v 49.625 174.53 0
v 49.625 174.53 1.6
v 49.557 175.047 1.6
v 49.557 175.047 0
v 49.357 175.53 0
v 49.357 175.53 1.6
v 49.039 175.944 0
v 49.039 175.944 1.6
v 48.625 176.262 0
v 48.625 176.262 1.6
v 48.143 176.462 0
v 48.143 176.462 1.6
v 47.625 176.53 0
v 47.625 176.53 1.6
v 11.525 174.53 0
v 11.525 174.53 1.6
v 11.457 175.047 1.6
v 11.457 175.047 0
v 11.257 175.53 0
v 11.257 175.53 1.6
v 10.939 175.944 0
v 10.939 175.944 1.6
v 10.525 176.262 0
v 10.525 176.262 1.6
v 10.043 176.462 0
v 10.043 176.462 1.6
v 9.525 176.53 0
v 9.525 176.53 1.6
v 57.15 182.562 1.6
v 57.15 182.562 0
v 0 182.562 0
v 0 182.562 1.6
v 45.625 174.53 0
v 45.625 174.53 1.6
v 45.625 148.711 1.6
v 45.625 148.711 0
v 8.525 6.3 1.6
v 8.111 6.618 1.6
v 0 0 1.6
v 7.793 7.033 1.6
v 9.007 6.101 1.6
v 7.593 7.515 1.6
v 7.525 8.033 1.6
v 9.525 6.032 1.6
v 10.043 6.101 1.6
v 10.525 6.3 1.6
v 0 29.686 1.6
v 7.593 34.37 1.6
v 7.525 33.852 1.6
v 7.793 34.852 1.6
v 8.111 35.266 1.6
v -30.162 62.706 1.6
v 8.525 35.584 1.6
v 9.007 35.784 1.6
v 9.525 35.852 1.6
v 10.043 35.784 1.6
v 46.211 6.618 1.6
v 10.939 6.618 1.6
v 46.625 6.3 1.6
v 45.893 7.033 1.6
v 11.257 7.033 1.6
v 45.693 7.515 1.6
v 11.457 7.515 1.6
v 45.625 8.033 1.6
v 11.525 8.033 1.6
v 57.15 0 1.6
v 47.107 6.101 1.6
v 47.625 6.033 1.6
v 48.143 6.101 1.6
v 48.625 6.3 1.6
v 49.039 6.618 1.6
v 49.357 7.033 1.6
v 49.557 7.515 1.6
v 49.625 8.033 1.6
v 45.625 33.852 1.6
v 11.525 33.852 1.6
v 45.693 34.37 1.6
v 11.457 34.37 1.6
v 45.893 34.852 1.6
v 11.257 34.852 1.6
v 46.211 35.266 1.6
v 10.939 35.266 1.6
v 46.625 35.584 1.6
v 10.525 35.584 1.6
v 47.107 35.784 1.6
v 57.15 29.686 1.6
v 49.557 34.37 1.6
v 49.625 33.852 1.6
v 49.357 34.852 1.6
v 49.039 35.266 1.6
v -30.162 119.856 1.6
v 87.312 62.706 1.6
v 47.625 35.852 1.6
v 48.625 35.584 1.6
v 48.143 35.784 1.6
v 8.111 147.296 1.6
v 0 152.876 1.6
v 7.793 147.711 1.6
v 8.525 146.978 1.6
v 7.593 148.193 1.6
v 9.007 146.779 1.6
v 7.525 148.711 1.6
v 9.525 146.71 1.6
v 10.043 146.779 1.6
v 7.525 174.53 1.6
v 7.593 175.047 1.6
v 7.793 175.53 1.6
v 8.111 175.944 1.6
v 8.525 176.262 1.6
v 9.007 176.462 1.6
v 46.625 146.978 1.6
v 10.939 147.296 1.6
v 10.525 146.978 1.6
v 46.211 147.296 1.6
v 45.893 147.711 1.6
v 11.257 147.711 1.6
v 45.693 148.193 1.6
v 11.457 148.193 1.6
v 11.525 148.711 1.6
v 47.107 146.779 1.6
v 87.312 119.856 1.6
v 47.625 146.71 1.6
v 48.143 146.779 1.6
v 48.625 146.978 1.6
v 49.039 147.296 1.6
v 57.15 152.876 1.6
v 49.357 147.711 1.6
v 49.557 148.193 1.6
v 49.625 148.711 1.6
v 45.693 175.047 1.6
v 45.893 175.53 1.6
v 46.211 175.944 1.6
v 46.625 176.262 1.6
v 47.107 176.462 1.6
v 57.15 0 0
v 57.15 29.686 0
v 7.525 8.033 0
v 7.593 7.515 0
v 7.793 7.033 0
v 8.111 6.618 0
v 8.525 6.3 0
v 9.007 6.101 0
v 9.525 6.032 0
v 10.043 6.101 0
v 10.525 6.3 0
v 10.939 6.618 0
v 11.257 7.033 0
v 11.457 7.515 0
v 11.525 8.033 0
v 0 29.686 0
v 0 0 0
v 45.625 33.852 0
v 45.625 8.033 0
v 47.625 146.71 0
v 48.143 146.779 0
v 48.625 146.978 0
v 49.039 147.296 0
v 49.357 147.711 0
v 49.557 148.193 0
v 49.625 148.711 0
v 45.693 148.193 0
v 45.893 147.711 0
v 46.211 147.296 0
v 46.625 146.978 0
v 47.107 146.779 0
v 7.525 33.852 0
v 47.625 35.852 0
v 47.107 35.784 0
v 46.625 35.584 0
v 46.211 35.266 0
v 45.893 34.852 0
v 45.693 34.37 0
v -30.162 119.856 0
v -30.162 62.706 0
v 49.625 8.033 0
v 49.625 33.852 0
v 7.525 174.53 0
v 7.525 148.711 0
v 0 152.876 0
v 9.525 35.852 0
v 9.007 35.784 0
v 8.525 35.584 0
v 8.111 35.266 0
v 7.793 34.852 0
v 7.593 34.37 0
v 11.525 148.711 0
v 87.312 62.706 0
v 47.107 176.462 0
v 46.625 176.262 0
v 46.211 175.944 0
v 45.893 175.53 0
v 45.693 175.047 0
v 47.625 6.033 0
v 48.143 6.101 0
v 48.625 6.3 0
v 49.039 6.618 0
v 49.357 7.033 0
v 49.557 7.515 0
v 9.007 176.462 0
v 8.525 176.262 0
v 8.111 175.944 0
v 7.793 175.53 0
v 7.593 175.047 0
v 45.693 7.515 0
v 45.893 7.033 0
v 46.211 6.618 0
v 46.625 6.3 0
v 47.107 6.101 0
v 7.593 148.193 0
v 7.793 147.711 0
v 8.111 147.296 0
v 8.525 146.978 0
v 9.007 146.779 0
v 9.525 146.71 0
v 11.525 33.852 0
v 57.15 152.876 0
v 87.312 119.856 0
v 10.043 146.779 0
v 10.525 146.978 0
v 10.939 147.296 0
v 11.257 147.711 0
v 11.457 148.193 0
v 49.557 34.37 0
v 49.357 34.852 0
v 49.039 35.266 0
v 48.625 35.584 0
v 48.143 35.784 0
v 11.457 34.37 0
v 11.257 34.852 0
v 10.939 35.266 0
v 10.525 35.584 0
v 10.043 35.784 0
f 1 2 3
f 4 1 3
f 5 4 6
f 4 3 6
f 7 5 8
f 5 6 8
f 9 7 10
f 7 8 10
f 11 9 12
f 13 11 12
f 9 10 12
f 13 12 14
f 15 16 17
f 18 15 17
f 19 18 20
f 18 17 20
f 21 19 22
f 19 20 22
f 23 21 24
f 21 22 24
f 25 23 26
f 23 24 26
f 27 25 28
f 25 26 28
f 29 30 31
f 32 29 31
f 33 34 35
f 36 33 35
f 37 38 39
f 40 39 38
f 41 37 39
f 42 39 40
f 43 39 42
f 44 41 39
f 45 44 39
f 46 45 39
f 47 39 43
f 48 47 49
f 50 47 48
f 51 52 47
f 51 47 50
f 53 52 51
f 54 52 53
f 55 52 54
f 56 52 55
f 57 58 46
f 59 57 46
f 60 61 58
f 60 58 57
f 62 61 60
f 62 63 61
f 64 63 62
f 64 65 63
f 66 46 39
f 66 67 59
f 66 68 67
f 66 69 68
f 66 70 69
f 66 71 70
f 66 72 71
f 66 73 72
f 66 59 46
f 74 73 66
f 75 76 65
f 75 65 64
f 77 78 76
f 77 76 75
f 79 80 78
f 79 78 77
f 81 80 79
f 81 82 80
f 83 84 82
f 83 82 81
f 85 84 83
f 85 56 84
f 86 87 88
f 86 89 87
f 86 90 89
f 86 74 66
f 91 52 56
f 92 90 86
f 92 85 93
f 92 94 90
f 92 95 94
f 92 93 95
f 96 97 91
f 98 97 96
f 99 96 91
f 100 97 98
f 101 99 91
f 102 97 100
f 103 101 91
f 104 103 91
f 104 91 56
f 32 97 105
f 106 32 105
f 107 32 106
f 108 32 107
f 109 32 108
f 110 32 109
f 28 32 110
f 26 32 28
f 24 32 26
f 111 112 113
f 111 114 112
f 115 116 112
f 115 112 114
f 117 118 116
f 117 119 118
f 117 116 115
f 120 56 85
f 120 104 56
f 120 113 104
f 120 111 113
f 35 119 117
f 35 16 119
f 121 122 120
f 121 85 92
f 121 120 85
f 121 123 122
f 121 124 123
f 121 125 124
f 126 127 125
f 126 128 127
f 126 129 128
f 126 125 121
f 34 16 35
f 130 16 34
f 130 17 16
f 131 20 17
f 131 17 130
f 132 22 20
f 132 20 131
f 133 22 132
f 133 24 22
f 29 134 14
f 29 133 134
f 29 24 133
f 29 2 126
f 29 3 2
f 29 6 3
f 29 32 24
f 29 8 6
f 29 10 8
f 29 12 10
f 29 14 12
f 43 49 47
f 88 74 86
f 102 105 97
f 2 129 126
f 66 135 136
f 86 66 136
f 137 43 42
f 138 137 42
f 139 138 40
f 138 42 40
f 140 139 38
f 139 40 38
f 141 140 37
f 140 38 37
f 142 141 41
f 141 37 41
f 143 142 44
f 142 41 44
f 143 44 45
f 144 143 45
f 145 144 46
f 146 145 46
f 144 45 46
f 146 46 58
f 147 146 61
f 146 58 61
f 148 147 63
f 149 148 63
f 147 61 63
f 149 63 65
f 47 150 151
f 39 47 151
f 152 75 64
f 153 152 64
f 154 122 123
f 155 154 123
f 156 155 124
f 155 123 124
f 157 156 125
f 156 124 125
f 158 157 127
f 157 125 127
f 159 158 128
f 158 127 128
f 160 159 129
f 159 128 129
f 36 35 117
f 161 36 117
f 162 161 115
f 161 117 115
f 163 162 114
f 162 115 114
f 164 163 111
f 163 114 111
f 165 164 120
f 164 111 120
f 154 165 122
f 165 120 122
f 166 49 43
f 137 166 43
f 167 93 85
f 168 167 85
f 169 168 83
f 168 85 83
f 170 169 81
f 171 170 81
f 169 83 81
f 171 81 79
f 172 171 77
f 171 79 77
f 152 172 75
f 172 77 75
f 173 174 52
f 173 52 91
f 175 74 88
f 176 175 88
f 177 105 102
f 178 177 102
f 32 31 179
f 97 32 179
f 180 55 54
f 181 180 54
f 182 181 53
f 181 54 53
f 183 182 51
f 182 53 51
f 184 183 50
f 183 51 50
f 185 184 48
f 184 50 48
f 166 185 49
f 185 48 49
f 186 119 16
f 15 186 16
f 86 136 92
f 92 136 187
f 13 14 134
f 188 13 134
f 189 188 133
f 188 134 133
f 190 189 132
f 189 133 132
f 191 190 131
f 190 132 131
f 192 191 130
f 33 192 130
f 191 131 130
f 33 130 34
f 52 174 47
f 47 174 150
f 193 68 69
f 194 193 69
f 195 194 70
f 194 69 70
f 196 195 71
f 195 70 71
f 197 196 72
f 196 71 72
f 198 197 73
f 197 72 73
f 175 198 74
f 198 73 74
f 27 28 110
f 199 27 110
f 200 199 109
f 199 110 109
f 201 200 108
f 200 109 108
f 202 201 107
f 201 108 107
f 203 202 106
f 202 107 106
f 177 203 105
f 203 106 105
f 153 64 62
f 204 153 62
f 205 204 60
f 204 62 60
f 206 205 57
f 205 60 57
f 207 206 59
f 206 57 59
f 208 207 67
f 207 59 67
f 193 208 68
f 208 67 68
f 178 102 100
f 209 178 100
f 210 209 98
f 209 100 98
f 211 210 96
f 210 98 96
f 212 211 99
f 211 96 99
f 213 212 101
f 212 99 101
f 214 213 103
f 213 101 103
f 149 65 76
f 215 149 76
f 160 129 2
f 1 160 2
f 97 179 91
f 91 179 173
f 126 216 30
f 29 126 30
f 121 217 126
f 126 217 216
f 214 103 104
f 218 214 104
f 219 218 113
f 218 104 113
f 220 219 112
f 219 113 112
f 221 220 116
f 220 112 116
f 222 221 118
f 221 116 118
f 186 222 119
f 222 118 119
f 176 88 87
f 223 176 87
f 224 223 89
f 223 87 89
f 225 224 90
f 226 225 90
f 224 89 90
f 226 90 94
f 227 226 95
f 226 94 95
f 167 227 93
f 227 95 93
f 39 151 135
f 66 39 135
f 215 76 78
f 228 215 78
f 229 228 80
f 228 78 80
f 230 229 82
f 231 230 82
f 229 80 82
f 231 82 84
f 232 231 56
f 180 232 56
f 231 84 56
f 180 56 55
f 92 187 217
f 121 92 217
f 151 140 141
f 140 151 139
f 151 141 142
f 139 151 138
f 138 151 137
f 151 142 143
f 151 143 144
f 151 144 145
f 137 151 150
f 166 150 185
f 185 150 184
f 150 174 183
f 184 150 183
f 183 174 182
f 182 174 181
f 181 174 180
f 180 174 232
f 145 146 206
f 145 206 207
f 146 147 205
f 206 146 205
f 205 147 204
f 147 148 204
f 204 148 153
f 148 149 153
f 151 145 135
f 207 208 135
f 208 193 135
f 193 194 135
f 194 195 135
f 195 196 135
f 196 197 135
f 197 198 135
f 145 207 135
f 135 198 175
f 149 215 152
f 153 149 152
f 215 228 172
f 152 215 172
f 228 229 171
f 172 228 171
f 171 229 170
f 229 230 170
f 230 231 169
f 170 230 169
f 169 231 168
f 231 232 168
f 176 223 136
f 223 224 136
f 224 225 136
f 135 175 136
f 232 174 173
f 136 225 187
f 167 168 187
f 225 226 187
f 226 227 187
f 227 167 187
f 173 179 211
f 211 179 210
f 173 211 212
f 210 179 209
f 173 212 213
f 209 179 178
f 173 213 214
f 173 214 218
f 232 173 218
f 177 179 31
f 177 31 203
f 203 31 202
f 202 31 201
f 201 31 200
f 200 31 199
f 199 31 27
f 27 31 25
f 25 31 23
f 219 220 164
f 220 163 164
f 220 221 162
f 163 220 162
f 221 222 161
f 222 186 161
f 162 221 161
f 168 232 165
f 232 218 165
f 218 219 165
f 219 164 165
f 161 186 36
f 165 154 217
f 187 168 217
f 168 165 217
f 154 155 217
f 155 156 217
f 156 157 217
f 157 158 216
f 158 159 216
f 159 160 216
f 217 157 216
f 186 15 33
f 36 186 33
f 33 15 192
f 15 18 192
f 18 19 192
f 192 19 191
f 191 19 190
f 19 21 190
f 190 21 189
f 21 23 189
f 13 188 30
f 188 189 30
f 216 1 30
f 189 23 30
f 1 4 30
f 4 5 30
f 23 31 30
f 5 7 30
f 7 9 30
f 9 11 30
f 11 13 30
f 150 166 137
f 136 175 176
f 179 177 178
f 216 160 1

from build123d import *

# Parameters (mm, degrees)
F0_W     = 30.1625
F0_H     = 57.15
F0_W_2   = 57.15
F1_DEPTH = 1.6002
F3_DEPTH = 1.6012


with BuildPart() as f1:
    # F0 (on Top) → F1 (new body)
    with BuildSketch(Plane.XY):
        Polygon((57.15, 62.70625), (57.15, 29.68625), (87.3125, 62.70625), align=None)
        Polygon((-30.1625, 62.70625), (0, 29.68625), (0, 62.70625), align=None)
        Polygon((57.15, 152.87625), (57.15, 119.85625), (87.3125, 119.85625), align=None)
        Polygon((-30.1625, 119.85625), (0, 119.85625), (0, 152.87625), align=None)
        Polygon((0, 29.68625), (0, 0), (57.15, 0), (57.15, 29.68625), (57.15, 62.70625), (0, 62.70625), align=None)
        with Locations((-15.08125, 91.28125)):
            Rectangle(F0_W, F0_H)
        with Locations((72.23125, 91.28125)):
            Rectangle(F0_W, F0_H)
        with Locations((28.575, 91.28125)):
            Rectangle(F0_W_2, F0_H)
        Polygon((0, 152.87625), (0, 119.85625), (57.15, 119.85625), (57.15, 152.87625), (57.15, 182.5625), (0, 182.5625), align=None)
    extrude(amount=F1_DEPTH)

    # F2 (on face) → F3 (cut, through all)
    with BuildSketch(Plane.XY.offset(1.6002)):
        with BuildLine():
            ThreePointArc((11.52525, 174.52975), (10.9393903391, 175.9441403391), (9.525, 176.53))
            ThreePointArc((9.525, 176.53), (8.1106096609, 175.9441403391), (7.52475, 174.52975))
            Line((7.52475, 174.52975), (7.52475, 148.71065))
            ThreePointArc((7.52475, 148.71065), (8.1106096609, 147.2962596609), (9.525, 146.7104))
            ThreePointArc((9.525, 146.7104), (10.9393903391, 147.2962596609), (11.52525, 148.71065))
            Line((11.52525, 148.71065), (11.52525, 174.52975))
        make_face()
        with BuildLine():
            ThreePointArc((49.62525, 174.52975), (49.0393903391, 175.9441403391), (47.625, 176.53))
            ThreePointArc((47.625, 176.53), (46.2106096609, 175.9441403391), (45.62475, 174.52975))
            Line((45.62475, 174.52975), (45.62475, 148.71065))
            ThreePointArc((45.62475, 148.71065), (46.2106096609, 147.2962596609), (47.625, 146.7104))
            ThreePointArc((47.625, 146.7104), (49.0393903391, 147.2962596609), (49.62525, 148.71065))
            Line((49.62525, 148.71065), (49.62525, 174.52975))
        make_face()
        with BuildLine():
            ThreePointArc((7.52475, 8.03275), (8.1106096609, 6.6183596609), (9.525, 6.0325))
            ThreePointArc((9.525, 6.0325), (10.9393903391, 6.6183596609), (11.52525, 8.03275))
            Line((11.52525, 8.03275), (11.52525, 33.85185))
            ThreePointArc((11.52525, 33.85185), (10.9393903391, 35.2662403391), (9.525, 35.8521))
            ThreePointArc((9.525, 35.8521), (8.1106096609, 35.2662403391), (7.52475, 33.85185))
            Line((7.52475, 33.85185), (7.52475, 8.03275))
        make_face()
        with BuildLine():
            ThreePointArc((45.62475, 8.03275), (46.2106096609, 6.6183596609), (47.625, 6.0325))
            ThreePointArc((47.625, 6.0325), (49.0393903391, 6.6183596609), (49.62525, 8.03275))
            Line((49.62525, 8.03275), (49.62525, 33.85185))
            ThreePointArc((49.62525, 33.85185), (49.0393903391, 35.2662403391), (47.625, 35.8521))
            ThreePointArc((47.625, 35.8521), (46.2106096609, 35.2662403391), (45.62475, 33.85185))
            Line((45.62475, 33.85185), (45.62475, 8.03275))
        make_face()
    extrude(amount=-F3_DEPTH, mode=Mode.SUBTRACT)


solid = f1.part
